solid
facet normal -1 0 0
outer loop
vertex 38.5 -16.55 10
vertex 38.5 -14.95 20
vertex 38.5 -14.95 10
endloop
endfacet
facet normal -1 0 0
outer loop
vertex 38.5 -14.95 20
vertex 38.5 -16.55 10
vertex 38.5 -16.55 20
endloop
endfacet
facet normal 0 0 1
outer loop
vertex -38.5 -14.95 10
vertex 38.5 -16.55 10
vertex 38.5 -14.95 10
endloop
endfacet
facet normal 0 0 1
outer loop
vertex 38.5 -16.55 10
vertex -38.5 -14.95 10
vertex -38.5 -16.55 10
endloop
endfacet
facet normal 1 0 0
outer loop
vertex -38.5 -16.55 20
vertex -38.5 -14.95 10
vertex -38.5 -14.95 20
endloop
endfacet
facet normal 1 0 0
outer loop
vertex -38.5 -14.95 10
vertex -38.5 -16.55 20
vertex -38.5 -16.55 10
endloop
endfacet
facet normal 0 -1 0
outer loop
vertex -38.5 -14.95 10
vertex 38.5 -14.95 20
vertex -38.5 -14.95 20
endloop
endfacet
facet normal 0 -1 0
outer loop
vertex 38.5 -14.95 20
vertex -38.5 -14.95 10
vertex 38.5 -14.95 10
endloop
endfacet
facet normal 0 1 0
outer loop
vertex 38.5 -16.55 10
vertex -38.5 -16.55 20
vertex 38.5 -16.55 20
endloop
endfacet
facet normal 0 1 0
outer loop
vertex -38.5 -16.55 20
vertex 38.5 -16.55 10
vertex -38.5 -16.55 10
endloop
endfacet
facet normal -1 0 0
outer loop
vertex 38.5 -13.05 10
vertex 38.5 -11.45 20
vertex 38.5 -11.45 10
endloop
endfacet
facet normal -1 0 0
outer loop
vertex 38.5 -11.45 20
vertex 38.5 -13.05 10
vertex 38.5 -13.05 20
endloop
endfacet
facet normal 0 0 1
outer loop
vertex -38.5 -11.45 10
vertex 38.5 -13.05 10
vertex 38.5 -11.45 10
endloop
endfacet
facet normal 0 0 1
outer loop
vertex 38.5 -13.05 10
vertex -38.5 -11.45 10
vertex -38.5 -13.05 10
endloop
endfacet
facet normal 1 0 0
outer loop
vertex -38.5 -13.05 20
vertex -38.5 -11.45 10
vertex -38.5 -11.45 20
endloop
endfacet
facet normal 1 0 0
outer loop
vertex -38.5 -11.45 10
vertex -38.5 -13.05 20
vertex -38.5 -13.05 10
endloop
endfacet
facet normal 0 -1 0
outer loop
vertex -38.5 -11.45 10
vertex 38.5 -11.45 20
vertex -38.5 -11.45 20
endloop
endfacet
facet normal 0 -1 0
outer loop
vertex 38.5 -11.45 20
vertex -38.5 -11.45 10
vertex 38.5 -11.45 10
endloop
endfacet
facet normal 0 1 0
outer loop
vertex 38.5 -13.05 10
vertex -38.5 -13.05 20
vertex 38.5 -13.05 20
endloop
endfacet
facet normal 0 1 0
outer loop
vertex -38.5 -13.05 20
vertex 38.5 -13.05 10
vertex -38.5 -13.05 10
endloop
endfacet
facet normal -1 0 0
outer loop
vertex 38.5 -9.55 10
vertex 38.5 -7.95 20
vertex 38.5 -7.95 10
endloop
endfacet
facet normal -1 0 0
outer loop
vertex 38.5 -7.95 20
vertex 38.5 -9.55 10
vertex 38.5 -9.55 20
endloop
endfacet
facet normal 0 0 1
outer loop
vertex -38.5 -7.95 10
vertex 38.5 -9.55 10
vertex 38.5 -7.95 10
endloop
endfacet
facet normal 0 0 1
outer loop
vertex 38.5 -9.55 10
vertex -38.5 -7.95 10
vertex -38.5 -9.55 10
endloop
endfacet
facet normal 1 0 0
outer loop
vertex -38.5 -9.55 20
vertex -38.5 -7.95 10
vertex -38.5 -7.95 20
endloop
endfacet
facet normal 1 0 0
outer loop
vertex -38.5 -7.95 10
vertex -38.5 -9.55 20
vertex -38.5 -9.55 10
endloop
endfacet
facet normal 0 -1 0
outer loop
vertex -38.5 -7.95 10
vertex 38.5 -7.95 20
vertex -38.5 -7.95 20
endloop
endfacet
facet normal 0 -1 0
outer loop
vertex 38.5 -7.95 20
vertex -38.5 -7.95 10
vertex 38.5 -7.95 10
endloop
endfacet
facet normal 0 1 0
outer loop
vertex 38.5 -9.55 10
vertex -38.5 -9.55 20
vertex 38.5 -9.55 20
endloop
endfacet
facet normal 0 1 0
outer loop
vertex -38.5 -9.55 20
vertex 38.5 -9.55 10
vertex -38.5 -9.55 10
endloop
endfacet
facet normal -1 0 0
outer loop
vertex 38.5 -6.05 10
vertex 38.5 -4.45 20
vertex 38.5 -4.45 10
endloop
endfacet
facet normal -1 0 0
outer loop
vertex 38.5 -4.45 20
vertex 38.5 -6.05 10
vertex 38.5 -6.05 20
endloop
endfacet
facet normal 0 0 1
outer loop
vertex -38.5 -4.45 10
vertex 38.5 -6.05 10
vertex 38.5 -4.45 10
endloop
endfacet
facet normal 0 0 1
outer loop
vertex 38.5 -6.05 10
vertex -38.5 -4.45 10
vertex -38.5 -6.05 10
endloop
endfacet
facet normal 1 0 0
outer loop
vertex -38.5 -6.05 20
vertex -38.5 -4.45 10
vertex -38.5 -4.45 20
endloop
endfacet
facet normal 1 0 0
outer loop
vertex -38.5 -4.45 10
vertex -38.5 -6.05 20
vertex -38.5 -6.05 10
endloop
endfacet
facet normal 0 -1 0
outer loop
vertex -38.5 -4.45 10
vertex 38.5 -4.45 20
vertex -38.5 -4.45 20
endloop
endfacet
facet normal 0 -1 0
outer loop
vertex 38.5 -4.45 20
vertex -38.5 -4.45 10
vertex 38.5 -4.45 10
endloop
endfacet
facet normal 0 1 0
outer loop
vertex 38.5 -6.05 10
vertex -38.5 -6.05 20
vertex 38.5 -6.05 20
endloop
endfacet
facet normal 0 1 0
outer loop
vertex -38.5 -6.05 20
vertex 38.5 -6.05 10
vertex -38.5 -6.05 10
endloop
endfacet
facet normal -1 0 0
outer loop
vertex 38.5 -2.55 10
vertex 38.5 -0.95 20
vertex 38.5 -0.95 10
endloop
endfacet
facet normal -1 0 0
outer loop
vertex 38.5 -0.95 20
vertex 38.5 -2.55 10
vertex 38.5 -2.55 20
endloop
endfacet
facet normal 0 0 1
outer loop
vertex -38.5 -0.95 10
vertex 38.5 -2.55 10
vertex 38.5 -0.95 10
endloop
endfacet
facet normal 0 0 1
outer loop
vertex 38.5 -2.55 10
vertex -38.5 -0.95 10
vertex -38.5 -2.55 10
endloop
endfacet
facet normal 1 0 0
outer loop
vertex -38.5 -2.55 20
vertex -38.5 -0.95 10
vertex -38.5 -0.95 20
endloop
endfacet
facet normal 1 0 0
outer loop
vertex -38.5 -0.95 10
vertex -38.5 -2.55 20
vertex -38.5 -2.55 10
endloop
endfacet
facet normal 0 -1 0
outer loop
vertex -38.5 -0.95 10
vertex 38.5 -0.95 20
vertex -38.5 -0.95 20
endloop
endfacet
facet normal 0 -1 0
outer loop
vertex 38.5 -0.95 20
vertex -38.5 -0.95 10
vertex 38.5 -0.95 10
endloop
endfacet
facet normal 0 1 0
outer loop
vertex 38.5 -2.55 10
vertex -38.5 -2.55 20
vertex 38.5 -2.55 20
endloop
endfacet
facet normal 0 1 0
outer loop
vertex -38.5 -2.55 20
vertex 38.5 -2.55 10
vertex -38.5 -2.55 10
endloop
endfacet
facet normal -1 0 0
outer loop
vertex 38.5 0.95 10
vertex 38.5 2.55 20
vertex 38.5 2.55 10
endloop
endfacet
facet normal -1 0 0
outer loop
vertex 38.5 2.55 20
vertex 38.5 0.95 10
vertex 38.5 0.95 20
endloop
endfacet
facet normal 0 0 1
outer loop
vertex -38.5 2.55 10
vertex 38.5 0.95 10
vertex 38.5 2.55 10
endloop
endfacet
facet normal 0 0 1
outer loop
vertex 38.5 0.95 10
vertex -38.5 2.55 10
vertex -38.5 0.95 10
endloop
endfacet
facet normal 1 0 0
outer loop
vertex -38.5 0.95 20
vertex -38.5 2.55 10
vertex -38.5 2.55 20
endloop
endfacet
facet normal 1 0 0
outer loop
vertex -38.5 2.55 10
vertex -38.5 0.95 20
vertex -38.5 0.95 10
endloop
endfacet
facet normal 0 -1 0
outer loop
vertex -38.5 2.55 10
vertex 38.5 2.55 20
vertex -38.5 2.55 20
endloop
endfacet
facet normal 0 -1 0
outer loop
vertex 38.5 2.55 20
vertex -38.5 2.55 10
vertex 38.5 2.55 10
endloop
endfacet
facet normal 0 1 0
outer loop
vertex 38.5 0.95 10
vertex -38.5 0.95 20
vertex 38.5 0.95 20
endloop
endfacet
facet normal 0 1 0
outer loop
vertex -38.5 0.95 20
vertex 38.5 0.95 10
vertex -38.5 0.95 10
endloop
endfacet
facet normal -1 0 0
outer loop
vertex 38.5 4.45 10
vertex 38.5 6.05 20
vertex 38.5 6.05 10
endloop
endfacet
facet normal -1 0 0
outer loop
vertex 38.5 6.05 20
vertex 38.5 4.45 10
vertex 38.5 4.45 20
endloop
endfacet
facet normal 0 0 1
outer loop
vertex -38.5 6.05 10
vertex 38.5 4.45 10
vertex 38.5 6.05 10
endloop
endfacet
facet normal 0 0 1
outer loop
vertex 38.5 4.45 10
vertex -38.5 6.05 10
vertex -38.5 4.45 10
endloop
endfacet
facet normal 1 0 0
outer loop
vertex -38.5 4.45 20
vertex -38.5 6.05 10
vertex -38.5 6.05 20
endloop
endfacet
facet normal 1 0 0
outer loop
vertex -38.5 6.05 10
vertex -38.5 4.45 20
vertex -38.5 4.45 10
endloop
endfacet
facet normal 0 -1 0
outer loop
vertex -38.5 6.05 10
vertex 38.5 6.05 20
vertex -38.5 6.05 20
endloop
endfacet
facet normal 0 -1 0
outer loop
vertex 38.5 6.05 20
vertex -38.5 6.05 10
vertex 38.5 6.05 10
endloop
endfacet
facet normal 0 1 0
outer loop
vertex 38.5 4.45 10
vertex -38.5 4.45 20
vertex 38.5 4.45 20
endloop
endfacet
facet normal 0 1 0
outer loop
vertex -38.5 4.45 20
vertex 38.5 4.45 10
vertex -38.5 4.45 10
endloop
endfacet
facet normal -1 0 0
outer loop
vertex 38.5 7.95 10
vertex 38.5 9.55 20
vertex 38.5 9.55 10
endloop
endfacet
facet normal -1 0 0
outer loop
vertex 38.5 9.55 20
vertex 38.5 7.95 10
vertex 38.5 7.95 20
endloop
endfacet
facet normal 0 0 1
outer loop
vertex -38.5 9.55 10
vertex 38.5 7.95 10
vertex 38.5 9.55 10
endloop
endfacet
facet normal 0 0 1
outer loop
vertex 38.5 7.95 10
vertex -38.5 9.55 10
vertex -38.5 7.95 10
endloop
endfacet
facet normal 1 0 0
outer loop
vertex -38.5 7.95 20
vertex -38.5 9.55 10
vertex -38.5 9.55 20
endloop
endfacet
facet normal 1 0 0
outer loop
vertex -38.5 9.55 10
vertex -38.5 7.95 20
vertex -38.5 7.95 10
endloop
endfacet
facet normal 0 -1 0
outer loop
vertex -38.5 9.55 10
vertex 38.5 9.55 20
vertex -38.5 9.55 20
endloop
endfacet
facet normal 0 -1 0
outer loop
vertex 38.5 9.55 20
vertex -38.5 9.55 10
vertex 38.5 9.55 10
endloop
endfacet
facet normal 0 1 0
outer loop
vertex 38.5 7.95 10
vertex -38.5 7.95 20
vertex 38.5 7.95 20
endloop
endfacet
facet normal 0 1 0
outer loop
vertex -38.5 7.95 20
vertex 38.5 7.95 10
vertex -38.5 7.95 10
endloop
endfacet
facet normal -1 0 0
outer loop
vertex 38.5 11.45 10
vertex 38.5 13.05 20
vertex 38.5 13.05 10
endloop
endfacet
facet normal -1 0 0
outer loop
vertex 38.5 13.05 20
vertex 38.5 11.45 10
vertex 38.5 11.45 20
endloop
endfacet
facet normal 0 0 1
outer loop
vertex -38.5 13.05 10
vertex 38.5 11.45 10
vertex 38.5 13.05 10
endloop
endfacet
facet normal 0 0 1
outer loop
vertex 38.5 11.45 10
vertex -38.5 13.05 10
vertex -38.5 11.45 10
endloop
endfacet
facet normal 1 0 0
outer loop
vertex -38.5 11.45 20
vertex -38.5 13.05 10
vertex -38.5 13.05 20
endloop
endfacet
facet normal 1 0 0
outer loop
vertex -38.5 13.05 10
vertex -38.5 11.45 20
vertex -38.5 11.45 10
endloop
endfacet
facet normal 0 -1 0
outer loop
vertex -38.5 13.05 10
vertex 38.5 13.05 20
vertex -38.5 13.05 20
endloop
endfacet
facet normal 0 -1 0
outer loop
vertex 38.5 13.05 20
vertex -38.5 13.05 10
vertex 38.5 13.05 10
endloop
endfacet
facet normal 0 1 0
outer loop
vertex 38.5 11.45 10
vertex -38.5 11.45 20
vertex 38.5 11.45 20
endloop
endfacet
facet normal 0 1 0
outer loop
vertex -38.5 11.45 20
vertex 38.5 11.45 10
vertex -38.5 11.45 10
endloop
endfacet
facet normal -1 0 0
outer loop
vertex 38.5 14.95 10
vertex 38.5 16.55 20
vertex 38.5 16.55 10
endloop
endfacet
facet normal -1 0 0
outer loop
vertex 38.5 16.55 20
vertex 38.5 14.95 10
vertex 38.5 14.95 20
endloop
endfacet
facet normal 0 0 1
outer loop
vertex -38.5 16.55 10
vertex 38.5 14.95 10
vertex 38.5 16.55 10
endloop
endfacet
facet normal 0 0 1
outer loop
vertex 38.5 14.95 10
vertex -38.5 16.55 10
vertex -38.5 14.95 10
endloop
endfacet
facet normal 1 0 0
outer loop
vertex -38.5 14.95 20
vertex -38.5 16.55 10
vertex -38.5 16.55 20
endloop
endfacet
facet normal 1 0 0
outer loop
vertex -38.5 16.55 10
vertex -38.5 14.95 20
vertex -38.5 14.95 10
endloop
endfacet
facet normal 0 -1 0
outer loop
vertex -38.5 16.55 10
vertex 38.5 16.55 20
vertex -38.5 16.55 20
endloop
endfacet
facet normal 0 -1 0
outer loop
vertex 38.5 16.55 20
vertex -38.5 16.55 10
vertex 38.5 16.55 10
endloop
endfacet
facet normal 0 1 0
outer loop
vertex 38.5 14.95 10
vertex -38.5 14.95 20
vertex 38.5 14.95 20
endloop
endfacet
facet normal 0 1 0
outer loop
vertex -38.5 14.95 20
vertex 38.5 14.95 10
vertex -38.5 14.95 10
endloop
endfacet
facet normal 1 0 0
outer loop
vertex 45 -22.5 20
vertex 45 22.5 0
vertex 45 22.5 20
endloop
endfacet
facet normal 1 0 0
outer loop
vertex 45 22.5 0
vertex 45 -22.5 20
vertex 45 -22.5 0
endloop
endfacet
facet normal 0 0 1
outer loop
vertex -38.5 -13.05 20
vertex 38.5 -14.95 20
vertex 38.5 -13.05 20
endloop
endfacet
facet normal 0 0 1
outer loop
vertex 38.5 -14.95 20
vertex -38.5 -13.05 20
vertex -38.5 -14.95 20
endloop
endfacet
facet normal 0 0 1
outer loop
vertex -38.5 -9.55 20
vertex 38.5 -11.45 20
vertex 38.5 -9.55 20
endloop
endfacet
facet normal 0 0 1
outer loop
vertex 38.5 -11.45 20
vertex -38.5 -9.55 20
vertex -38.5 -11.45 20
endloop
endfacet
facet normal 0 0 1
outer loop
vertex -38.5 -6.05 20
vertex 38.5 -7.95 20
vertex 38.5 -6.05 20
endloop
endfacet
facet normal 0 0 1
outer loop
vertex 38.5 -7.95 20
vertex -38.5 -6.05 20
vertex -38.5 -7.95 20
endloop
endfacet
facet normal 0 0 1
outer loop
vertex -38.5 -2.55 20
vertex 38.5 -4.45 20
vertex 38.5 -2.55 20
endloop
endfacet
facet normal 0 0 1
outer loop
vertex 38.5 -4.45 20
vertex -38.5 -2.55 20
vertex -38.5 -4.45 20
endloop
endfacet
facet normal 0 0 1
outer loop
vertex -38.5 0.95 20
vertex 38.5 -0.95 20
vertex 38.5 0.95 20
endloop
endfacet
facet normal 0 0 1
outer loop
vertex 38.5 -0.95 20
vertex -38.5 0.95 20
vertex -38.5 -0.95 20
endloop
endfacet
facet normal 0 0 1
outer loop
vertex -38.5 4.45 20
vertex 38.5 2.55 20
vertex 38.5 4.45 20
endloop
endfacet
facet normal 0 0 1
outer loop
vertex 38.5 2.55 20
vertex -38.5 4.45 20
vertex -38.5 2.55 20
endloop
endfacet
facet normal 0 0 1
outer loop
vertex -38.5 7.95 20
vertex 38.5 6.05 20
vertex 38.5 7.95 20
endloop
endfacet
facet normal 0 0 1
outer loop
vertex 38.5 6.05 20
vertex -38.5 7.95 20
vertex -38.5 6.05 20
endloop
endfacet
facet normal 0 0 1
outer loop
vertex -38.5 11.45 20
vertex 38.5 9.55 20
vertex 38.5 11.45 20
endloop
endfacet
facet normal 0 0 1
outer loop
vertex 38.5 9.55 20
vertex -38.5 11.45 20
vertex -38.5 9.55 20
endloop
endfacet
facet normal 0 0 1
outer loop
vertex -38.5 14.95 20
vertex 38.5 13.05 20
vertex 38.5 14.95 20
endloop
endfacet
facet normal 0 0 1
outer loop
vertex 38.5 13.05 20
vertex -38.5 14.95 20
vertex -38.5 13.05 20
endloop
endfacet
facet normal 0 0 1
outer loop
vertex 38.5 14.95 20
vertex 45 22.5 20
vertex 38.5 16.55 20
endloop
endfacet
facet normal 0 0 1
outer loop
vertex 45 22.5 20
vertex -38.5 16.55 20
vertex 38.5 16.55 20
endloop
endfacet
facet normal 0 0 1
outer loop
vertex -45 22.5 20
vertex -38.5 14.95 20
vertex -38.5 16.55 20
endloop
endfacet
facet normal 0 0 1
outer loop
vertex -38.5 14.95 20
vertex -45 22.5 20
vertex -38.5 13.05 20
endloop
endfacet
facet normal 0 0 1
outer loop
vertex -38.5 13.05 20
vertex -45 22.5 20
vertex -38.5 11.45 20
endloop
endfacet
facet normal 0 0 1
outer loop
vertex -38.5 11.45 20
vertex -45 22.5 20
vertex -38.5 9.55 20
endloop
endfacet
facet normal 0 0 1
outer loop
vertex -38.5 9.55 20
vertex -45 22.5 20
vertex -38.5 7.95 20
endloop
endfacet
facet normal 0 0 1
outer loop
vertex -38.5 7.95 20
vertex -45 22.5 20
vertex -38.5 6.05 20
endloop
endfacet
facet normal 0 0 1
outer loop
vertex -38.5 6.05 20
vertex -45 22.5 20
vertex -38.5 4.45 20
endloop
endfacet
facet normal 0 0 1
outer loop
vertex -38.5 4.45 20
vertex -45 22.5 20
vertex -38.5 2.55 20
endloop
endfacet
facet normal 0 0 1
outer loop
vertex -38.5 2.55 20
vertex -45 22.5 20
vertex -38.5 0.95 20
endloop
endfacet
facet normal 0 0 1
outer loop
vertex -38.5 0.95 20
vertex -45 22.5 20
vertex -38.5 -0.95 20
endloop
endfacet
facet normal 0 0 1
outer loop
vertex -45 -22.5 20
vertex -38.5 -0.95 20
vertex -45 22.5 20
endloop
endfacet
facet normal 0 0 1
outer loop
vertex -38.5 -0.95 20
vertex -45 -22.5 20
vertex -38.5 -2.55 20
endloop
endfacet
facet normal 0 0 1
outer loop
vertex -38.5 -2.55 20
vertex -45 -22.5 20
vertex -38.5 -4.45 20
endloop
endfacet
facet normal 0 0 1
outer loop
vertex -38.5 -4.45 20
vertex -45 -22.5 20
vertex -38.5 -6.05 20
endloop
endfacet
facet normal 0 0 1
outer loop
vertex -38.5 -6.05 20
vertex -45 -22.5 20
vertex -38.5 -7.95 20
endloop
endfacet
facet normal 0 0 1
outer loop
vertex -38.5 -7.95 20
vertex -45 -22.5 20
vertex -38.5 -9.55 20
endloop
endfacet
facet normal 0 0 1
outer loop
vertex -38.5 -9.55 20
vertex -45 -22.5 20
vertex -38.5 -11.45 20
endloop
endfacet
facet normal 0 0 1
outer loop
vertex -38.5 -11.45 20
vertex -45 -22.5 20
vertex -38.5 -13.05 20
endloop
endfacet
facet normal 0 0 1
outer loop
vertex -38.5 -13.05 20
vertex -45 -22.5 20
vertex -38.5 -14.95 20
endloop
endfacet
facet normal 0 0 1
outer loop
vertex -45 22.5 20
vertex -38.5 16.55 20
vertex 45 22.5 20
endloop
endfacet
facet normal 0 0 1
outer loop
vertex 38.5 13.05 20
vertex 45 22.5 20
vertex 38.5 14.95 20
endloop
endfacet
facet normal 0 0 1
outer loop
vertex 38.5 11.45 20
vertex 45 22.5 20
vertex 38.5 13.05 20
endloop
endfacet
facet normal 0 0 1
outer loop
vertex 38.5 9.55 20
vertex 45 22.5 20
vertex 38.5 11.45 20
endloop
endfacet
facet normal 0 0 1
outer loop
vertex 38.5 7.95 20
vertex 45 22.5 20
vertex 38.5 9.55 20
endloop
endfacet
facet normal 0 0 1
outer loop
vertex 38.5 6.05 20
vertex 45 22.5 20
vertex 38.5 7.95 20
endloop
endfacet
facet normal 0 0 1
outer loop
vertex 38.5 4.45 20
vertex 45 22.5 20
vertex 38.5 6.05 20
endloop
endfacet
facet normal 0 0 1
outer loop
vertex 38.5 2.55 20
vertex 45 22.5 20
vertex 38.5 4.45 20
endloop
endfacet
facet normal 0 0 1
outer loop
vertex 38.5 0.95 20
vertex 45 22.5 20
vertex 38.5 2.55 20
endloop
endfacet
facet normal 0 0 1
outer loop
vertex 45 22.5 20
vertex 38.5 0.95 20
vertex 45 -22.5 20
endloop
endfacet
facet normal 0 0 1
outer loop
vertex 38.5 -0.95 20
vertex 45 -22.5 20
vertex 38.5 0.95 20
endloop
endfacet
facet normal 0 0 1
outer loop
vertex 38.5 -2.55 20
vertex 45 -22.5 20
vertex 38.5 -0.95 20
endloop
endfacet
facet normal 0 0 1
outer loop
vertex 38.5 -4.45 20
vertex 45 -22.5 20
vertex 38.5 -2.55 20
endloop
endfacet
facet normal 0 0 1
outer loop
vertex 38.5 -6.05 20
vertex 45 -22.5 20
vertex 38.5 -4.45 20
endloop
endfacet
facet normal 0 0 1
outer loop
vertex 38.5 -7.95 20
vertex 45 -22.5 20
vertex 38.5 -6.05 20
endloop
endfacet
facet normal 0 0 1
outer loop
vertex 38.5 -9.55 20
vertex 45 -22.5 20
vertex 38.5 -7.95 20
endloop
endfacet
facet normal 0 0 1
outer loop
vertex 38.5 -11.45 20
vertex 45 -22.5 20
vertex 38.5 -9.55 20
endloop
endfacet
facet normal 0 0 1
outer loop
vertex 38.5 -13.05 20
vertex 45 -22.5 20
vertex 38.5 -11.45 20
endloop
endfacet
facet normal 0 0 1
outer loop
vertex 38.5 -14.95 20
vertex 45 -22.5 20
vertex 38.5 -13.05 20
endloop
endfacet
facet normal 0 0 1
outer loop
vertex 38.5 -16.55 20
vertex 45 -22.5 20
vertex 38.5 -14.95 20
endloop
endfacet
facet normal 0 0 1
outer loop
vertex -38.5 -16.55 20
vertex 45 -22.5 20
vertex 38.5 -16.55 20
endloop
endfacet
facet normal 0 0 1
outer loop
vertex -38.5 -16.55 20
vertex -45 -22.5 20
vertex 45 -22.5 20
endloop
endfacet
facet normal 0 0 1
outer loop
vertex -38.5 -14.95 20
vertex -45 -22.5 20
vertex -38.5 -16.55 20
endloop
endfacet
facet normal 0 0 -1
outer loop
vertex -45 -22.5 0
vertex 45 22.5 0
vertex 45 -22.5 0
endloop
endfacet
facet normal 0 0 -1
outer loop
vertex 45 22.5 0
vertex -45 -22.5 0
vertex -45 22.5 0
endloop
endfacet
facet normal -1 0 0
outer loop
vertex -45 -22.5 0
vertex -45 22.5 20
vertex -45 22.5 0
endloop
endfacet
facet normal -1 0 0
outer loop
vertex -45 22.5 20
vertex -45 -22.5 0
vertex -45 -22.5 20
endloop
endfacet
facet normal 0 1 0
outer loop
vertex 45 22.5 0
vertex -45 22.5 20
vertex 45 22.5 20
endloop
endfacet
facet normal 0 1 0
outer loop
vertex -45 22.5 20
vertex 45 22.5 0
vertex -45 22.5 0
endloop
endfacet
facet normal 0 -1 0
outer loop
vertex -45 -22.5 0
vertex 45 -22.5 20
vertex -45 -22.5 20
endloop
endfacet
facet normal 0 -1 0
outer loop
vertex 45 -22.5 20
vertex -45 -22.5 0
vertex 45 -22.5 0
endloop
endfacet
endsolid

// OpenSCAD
// Microscope slide drying rack

$fn = 64;

// Base block
base_l = 90;        // length along X
base_w = 45;        // width along Y
base_h = 20;        // height along Z

// Slots
slot_count = 10;    // number of slots
slot_l = 77;        // slot length along X
slot_w = 1.6;       // slot width along Y
slot_d = 10;        // slot depth along Z
slot_pitch = 3.5;   // centre-to-centre spacing in Y

eps = 0.5;          // cutter overshoot past top face

difference() {
    // solid base, centred in X and Y, sitting on z = 0
    translate([-base_l/2, -base_w/2, 0])
        cube([base_l, base_w, base_h]);

    // slots cut from the top face
    for (i = [0 : slot_count - 1]) {
        y = (i - (slot_count - 1) / 2) * slot_pitch;
        translate([-slot_l/2, y - slot_w/2, base_h - slot_d])
            cube([slot_l, slot_w, slot_d + eps]);
    }
}
